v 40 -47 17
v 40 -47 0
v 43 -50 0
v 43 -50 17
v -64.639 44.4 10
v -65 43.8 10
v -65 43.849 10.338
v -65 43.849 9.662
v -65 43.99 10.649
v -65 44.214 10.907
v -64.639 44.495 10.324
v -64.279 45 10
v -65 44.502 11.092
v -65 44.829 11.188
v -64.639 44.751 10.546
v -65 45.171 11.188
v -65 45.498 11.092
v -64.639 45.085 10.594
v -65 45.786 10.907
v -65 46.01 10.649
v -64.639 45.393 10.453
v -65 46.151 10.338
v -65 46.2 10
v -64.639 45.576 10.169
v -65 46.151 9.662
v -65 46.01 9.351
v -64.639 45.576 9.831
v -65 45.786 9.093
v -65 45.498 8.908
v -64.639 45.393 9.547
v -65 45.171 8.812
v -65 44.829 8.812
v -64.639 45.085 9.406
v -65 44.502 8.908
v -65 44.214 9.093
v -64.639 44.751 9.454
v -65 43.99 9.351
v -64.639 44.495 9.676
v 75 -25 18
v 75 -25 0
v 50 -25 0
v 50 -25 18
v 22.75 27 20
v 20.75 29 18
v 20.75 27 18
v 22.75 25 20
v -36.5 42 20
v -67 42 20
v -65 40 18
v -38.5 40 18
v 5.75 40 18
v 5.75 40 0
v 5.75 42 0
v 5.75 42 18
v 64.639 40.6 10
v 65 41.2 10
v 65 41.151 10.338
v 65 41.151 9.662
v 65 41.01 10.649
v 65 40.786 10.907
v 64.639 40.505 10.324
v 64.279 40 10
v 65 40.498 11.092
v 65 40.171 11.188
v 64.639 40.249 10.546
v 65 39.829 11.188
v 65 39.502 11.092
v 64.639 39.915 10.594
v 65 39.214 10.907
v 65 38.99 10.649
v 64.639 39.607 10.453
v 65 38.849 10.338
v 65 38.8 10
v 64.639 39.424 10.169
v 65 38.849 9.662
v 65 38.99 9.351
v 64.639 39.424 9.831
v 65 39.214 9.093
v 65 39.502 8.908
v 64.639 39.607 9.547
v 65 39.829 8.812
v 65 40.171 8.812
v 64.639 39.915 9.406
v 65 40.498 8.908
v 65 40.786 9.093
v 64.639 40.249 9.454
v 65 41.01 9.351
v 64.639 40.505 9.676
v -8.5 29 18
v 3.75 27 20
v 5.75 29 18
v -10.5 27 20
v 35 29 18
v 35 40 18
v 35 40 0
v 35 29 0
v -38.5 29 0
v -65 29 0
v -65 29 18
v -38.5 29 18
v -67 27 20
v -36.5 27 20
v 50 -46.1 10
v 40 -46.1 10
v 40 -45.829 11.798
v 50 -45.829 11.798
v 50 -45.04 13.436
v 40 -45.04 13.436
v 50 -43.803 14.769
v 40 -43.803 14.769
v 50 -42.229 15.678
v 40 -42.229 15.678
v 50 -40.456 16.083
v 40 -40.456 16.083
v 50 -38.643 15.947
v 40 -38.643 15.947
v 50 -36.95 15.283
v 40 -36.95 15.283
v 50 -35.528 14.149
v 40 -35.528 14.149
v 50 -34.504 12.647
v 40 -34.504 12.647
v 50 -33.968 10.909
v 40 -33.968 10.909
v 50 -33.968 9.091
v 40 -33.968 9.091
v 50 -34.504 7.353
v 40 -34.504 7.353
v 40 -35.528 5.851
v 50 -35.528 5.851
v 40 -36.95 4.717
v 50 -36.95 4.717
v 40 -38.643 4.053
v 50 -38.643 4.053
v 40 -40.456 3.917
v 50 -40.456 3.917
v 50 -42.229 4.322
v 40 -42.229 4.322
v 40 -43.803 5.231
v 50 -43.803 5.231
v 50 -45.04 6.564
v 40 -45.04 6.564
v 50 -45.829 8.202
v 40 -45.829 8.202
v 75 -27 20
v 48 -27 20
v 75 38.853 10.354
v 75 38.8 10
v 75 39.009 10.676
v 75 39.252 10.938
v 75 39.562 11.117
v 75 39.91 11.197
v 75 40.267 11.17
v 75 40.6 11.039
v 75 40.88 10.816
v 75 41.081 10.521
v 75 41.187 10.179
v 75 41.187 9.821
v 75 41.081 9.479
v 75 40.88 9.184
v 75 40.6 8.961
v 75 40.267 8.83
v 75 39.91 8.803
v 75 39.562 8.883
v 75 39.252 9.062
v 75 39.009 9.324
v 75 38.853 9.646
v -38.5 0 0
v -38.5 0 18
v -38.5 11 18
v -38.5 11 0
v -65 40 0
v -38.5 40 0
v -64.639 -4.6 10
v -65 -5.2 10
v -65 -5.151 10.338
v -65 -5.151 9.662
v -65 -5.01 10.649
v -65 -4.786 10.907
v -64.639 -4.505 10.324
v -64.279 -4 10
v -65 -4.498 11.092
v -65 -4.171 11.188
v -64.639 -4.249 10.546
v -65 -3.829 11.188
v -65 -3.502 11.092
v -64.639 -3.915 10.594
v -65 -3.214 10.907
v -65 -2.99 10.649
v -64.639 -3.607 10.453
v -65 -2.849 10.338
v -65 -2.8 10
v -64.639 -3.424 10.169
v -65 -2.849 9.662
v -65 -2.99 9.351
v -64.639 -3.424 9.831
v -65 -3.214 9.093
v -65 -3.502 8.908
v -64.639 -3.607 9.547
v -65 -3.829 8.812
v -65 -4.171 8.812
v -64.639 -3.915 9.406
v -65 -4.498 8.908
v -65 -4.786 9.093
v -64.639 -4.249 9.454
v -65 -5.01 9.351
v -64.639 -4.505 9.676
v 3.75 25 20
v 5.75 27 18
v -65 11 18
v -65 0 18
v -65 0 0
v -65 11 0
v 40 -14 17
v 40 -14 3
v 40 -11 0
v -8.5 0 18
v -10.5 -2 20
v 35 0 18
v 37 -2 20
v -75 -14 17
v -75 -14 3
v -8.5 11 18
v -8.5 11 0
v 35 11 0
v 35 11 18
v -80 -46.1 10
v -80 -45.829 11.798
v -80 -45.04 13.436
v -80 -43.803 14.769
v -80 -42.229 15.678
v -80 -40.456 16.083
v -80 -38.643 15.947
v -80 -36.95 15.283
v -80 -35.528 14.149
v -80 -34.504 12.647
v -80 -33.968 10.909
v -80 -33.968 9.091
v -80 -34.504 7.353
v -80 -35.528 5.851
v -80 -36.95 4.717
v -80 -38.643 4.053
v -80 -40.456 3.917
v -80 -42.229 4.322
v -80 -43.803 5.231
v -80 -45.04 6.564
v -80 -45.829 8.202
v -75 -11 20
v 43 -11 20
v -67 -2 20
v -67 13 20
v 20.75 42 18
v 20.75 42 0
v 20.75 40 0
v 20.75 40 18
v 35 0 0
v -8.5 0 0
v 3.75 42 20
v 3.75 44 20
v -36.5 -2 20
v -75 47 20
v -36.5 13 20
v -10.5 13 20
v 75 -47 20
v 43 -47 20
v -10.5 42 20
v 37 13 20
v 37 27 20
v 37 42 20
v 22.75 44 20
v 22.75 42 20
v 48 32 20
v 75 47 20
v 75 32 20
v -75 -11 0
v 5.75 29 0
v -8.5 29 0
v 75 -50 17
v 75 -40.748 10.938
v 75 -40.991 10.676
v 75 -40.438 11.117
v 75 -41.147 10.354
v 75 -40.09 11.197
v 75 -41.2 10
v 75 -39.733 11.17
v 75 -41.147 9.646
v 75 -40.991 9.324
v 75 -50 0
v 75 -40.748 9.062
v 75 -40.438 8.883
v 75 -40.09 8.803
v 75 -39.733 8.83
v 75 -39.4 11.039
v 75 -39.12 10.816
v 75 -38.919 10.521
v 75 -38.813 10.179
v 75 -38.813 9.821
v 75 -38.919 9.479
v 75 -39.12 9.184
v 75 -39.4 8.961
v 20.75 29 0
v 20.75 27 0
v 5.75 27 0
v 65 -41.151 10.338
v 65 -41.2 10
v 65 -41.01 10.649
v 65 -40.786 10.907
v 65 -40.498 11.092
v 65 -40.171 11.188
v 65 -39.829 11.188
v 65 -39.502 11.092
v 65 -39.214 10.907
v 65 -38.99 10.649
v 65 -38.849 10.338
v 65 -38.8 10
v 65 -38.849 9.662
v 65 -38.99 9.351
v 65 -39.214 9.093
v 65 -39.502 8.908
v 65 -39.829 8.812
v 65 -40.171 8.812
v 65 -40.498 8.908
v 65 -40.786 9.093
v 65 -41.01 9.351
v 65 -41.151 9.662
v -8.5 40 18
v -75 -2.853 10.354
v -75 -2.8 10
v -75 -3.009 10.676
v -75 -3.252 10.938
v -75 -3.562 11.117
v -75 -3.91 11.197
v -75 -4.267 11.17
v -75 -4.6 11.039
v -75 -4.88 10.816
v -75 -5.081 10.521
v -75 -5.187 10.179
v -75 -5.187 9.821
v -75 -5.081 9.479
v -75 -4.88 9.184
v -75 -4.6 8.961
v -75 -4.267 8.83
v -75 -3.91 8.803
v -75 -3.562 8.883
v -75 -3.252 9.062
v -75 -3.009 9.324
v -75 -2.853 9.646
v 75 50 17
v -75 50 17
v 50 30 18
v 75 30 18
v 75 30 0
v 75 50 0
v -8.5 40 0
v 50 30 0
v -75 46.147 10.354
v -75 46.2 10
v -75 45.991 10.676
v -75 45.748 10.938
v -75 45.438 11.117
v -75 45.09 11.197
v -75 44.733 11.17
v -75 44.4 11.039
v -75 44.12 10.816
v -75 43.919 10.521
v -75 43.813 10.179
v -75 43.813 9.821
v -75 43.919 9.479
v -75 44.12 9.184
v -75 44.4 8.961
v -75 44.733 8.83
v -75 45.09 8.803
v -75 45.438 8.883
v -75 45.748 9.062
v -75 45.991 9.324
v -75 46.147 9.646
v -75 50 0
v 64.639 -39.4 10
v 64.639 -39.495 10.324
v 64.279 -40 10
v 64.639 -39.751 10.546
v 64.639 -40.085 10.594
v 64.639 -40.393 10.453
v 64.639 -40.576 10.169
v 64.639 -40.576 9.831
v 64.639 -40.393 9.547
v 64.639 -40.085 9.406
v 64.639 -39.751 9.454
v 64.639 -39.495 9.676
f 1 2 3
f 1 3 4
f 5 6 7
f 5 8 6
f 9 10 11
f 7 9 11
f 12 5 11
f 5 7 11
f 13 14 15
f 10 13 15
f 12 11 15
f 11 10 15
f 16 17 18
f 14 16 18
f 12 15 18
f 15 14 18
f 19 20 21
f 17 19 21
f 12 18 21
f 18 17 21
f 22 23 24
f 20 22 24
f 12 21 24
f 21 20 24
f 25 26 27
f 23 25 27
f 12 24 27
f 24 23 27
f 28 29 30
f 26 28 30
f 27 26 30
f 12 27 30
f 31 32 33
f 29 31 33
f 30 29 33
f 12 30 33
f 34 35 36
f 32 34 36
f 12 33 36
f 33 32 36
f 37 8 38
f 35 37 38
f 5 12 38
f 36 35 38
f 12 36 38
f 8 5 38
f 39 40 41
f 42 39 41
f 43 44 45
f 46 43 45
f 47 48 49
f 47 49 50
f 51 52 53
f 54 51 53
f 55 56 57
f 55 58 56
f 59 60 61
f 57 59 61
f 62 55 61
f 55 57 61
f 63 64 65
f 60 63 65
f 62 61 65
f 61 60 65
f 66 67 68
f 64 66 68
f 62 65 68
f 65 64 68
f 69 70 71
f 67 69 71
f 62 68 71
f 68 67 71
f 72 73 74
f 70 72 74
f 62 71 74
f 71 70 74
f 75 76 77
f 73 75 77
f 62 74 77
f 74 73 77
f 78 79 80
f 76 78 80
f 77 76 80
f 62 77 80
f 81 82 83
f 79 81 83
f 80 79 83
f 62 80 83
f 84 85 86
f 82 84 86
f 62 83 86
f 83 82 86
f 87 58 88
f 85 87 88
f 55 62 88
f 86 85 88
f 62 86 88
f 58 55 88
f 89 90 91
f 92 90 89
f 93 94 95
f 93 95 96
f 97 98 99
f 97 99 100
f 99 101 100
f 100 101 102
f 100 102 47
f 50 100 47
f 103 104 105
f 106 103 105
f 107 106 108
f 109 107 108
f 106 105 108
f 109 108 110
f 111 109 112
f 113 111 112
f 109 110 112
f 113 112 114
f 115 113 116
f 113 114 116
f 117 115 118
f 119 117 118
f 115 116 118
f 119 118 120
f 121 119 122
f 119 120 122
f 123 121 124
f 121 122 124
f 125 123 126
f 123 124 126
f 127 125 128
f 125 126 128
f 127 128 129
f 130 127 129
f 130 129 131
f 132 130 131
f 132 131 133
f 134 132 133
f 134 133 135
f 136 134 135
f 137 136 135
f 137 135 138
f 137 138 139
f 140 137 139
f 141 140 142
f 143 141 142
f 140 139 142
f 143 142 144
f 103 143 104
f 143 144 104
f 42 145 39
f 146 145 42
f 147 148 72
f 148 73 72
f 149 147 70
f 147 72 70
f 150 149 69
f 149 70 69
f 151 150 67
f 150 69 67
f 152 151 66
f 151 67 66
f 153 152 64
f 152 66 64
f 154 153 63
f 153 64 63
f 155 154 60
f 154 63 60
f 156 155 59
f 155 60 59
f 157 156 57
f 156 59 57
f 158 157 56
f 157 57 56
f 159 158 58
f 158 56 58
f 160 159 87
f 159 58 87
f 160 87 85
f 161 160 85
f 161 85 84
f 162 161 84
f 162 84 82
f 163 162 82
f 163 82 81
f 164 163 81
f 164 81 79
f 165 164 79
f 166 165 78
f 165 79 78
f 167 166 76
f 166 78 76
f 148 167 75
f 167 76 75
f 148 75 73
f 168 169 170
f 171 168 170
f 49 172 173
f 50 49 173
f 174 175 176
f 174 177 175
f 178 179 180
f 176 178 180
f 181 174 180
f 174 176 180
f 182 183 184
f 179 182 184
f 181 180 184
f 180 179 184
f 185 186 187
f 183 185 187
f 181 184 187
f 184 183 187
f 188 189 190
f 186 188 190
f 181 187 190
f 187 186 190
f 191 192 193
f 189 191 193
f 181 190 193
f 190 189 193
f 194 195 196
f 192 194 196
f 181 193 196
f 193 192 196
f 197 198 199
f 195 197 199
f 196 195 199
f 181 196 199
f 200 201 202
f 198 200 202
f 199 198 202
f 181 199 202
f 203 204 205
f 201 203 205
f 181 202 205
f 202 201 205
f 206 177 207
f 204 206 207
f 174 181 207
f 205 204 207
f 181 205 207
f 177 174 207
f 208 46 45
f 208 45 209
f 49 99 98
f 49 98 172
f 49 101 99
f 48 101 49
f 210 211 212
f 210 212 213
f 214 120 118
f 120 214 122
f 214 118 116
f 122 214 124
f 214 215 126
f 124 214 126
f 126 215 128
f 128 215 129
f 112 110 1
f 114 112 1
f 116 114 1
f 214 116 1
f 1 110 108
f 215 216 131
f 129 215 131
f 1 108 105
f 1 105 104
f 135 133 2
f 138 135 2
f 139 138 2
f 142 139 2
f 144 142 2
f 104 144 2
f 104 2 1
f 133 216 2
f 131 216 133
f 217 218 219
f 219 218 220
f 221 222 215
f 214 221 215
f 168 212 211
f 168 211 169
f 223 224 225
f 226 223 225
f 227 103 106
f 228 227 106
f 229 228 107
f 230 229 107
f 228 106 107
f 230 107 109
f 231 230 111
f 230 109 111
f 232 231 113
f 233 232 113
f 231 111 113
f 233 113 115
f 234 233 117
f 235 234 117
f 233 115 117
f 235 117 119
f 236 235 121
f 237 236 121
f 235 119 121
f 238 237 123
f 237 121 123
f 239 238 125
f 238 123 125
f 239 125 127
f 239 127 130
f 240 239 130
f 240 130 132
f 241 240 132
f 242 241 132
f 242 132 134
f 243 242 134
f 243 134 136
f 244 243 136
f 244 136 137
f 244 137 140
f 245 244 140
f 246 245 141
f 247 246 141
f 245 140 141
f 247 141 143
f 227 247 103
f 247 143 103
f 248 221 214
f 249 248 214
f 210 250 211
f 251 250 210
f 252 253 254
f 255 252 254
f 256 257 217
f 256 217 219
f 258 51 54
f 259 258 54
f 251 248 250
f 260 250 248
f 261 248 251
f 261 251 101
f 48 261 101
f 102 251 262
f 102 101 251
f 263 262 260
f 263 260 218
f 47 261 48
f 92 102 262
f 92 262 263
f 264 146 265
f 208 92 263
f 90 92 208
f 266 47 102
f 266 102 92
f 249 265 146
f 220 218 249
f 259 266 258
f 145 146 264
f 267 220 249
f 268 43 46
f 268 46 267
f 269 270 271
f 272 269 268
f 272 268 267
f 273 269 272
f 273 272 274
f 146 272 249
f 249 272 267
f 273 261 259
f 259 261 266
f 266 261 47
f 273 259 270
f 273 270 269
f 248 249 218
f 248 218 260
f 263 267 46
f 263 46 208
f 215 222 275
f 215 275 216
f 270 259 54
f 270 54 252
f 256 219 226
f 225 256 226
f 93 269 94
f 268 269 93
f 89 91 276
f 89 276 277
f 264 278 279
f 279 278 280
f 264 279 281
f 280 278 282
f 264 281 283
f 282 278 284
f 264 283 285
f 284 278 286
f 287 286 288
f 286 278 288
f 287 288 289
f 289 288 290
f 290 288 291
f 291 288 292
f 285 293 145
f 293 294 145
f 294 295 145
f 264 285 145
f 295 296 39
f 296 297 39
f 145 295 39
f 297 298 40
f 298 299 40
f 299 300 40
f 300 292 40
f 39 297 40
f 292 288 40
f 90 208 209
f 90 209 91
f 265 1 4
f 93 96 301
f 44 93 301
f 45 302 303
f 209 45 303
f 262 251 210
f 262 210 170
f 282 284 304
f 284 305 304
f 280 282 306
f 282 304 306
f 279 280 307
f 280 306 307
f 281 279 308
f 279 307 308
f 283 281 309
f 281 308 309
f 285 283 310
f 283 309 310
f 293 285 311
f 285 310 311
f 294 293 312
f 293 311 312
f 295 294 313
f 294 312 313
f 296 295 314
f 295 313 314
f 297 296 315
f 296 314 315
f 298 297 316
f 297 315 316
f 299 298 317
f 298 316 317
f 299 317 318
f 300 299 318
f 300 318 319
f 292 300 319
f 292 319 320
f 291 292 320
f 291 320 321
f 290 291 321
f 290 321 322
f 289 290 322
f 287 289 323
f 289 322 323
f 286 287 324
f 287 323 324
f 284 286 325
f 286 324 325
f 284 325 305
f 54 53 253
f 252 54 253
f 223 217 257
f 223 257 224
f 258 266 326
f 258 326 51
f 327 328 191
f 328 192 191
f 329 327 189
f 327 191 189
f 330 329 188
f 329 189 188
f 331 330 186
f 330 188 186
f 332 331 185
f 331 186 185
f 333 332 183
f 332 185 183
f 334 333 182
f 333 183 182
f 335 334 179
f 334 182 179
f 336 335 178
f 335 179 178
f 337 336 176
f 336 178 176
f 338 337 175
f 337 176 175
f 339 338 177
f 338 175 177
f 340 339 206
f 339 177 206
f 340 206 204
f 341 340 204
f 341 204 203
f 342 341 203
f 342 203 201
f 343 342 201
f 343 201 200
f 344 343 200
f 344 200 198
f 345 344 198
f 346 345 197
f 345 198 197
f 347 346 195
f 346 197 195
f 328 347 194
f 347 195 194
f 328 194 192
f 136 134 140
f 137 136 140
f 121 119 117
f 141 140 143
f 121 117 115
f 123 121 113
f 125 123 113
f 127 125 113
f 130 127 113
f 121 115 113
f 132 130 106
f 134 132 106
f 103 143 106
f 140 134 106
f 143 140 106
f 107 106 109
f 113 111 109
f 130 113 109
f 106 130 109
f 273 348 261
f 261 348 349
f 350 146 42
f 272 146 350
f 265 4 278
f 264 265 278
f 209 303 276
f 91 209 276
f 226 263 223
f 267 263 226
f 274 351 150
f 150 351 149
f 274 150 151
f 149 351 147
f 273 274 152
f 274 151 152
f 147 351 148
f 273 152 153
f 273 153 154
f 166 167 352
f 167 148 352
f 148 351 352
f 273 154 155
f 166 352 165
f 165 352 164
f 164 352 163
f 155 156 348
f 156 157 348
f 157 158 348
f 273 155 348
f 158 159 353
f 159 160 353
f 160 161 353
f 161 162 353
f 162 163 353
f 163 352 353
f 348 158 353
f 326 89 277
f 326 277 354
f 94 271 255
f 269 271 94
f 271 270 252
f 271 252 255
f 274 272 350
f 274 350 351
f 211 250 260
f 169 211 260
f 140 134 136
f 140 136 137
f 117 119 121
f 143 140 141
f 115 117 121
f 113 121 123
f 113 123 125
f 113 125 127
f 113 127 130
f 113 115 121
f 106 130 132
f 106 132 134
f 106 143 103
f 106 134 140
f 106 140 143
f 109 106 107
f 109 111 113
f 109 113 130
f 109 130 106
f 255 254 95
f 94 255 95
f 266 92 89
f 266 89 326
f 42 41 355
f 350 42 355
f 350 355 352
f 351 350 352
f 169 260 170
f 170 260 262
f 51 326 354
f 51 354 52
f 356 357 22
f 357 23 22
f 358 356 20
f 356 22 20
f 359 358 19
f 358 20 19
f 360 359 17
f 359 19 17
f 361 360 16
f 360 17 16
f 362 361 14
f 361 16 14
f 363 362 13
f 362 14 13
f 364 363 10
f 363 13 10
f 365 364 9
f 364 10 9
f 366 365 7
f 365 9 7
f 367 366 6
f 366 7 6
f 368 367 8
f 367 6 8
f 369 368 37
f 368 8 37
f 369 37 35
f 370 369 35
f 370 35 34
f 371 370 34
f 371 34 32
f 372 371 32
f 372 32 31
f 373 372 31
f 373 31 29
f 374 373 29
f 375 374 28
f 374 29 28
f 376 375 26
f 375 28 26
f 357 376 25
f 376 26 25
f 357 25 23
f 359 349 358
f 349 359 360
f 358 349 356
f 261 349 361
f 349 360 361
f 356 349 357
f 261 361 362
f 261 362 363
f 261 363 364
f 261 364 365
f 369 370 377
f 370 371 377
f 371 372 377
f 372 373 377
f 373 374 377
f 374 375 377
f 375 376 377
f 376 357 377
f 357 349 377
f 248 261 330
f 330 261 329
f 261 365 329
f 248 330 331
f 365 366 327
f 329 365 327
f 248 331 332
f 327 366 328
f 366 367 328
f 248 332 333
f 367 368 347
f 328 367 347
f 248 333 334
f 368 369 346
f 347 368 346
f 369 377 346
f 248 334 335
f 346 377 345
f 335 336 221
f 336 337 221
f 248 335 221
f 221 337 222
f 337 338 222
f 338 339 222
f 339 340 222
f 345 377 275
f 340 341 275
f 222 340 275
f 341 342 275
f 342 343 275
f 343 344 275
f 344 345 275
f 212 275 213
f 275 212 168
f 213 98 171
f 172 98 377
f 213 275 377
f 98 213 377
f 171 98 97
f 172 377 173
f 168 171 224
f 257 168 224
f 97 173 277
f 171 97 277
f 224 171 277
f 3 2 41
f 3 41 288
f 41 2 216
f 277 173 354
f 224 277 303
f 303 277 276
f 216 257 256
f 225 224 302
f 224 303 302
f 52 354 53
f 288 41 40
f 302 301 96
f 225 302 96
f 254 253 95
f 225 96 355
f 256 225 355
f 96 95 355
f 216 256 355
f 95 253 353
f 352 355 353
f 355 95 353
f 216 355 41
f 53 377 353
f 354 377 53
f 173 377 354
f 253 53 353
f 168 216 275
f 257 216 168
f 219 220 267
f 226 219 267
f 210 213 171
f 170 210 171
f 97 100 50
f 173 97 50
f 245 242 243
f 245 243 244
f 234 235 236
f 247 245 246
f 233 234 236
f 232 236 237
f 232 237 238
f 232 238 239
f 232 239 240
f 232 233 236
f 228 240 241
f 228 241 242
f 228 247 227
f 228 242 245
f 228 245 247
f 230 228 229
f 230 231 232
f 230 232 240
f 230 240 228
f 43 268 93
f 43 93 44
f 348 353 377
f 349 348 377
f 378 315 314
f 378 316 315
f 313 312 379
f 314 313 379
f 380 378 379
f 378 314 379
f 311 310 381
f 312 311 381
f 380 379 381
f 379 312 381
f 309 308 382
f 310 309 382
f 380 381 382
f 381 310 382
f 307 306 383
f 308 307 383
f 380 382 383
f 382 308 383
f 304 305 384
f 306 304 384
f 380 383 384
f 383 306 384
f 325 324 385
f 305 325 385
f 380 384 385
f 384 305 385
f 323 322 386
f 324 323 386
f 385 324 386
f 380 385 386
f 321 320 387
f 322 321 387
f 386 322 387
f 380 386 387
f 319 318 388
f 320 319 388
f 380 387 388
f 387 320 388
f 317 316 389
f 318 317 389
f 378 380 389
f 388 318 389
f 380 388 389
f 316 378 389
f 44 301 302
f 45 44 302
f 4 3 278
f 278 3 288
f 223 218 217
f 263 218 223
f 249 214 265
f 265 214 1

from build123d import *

# Parameters (mm, degrees)
F0_W           = 26.5
F0_H           = 11
F0_W_2         = 43.5
F1_DEPTH       = 20
F2_SIZE        = 2
F3_R           = 6.1
F4_DEPTH       = 10
F5_DEPTH       = 130
F8_D           = 2.4
F8_DEPTH       = 10
F8_TIP         = 0.7210327428
F8_ON_F7_D     = 2.4
F8_ON_F7_DEPTH = 10
F8_ON_F7_TIP   = 0.7210327428
F9_SIZE        = 3


with BuildPart() as f1:
    # F0 (on Top) → F1 (new body)
    with BuildSketch(Plane.XY):
        Polygon((40, -50), (75, -50), (75, -25), (50, -25), (50, 30), (75, 30), (75, 50), (-75, 50), (-75, -14), (40, -14), align=None)
        with Locations((-51.75, 5.5)):
            Rectangle(F0_W, F0_H, mode=Mode.SUBTRACT)
        with Locations((-51.75, 34.5)):
            Rectangle(F0_W, F0_H, mode=Mode.SUBTRACT)
        with Locations((13.25, 5.5)):
            Rectangle(F0_W_2, F0_H, mode=Mode.SUBTRACT)
        Polygon((-8.5, 29), (-8.5, 40), (5.75, 40), (5.75, 42), (20.75, 42), (20.75, 40), (35, 40), (35, 29), (20.75, 29), (20.75, 27), (5.75, 27), (5.75, 29), align=None, mode=Mode.SUBTRACT)
    extrude(amount=F1_DEPTH)

    # F2
    f2_edges = [f1.edges().sort_by_distance(p)[0] for p in [
        (-51.75, 11, 20),
        (-65, 5.5, 20),
        (-51.75, 0, 20),
        (-38.5, 5.5, 20),
        (-38.5, 34.5, 20),
        (-51.75, 40, 20),
        (-51.75, 29, 20),
        (-65, 34.5, 20),
        (13.25, 11, 20),
        (-8.5, 5.5, 20),
        (13.25, 0, 20),
        (35, 5.5, 20),
        (62.5, 30, 20),
        (50, 2.5, 20),
        (62.5, -25, 20),
        (13.25, 42, 20),
        (5.75, 41, 20),
        (27.875, 40, 20),
        (20.75, 41, 20),
        (5.75, 28, 20),
        (13.25, 27, 20),
        (20.75, 28, 20),
        (27.875, 29, 20),
        (-8.5, 34.5, 20),
        (-1.375, 40, 20),
        (-1.375, 29, 20),
        (35, 34.5, 20),
    ]]
    chamfer(f2_edges, length=F2_SIZE)

    # F3 (on face) → F4 (cut)
    with BuildSketch(Plane(origin=(40, 0, 0), x_dir=(0, -1, 0), z_dir=(-1, 0, 0))):
        with Locations((40, 10)):
            Circle(F3_R)
    extrude(amount=-F4_DEPTH, mode=Mode.SUBTRACT)


with BuildPart() as f5:
    # F5 (new): a face of the model
    f5_faces = [f1.part.faces().sort_by_distance(p)[0] for p in [
        (50, -40, 10),
    ]]
    extrude(f5_faces, amount=F5_DEPTH)


with BuildPart() as f1_1:
    add(f1.part)

    # F8
    with Locations(Plane.YZ.offset(75)):
        with Locations((-40, 10), (40, 10)):
            Hole(F8_D / 2, depth=F8_DEPTH)
            with Locations((0, 0, -(F8_DEPTH + F8_TIP / 2))):  # 118° drill point
                Cone(0, F8_D / 2, F8_TIP, mode=Mode.SUBTRACT)

    # F8 on F7
    with Locations(Plane(origin=(-75, 0, 0), x_dir=(0, -1, 0), z_dir=(-1, 0, 0))):
        with Locations((4, 10), (-45, 10)):
            Hole(F8_ON_F7_D / 2, depth=F8_ON_F7_DEPTH)
            with Locations((0, 0, -(F8_ON_F7_DEPTH + F8_ON_F7_TIP / 2))):  # 118° drill point
                Cone(0, F8_ON_F7_D / 2, F8_ON_F7_TIP, mode=Mode.SUBTRACT)

    # F9
    f9_edges = [f1_1.edges().sort_by_distance(p)[0] for p in [
        (0, 50, 20),
        (40, -32, 20),
        (40, -50, 10),
        (57.5, -50, 20),
        (-17.5, -14, 20),
        (-17.5, -14, 0),
    ]]
    chamfer(f9_edges, length=F9_SIZE)


solid = Compound([f5.part, f1_1.part])
